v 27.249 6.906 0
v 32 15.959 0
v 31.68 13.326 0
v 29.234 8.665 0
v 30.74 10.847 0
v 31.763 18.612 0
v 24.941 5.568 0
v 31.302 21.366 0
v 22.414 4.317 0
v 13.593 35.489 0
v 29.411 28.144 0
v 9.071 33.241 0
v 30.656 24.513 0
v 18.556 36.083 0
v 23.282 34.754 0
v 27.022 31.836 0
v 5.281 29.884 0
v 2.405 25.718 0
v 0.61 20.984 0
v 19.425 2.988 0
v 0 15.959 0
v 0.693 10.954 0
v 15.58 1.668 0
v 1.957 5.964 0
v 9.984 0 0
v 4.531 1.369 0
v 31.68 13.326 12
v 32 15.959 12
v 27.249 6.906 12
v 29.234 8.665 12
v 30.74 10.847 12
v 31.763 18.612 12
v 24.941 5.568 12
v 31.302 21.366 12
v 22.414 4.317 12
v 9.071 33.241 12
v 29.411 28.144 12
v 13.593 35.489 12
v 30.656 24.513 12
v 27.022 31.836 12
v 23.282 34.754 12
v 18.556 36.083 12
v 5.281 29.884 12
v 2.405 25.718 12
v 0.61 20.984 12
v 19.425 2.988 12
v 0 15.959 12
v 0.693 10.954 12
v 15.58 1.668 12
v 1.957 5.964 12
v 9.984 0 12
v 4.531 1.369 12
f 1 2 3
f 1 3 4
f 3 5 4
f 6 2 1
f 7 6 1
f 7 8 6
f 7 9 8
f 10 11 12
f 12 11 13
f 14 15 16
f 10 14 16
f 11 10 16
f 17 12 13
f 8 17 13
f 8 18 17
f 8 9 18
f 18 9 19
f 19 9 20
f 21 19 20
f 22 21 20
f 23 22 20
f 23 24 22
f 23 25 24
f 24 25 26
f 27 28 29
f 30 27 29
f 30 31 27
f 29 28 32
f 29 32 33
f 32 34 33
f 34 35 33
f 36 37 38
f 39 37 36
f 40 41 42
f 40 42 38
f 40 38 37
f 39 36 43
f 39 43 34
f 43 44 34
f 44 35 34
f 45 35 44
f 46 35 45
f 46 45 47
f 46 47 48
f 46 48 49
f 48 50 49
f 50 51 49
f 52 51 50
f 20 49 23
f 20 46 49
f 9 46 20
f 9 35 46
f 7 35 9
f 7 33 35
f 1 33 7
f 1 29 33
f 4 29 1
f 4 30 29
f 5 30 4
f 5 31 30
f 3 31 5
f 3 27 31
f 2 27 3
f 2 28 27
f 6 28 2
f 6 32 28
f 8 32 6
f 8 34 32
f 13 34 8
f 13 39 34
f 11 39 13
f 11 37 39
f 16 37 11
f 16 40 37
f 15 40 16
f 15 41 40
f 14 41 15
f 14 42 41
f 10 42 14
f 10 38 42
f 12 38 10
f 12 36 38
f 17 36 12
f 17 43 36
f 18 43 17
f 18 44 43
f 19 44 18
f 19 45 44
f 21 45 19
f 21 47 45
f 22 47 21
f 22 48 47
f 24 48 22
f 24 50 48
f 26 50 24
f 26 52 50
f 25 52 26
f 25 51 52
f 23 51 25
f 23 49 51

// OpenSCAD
$fn = 32;

// ----------------------------------------------------------------------
// Cam disc: base radius 11.0 mm, lift 10.0 mm, 26 profile points
// ----------------------------------------------------------------------

// --- parameters (mm) ---
profile_height = 12;      // extrusion height
profile_points = 26;      // points of the closed outline

profile = [[32, 15.959], [31.763, 18.612], [31.302, 21.366], [30.656, 24.513], [29.411, 28.144], [27.022, 31.836], [23.282, 34.754], [18.556, 36.083], [13.593, 35.489], [9.071, 33.241], [5.281, 29.884], [2.405, 25.718], [0.61, 20.984], [0, 15.959], [0.693, 10.954], [1.957, 5.964], [4.531, 1.369], [9.984, 0], [15.58, 1.668], [19.425, 2.988], [22.414, 4.317], [24.941, 5.568], [27.249, 6.906], [29.234, 8.665], [30.74, 10.847], [31.68, 13.326]];  // single closed polygon, 26 points, counter clockwise

// --- the one profile operation ---
linear_extrude(height = profile_height) polygon(points = profile);
